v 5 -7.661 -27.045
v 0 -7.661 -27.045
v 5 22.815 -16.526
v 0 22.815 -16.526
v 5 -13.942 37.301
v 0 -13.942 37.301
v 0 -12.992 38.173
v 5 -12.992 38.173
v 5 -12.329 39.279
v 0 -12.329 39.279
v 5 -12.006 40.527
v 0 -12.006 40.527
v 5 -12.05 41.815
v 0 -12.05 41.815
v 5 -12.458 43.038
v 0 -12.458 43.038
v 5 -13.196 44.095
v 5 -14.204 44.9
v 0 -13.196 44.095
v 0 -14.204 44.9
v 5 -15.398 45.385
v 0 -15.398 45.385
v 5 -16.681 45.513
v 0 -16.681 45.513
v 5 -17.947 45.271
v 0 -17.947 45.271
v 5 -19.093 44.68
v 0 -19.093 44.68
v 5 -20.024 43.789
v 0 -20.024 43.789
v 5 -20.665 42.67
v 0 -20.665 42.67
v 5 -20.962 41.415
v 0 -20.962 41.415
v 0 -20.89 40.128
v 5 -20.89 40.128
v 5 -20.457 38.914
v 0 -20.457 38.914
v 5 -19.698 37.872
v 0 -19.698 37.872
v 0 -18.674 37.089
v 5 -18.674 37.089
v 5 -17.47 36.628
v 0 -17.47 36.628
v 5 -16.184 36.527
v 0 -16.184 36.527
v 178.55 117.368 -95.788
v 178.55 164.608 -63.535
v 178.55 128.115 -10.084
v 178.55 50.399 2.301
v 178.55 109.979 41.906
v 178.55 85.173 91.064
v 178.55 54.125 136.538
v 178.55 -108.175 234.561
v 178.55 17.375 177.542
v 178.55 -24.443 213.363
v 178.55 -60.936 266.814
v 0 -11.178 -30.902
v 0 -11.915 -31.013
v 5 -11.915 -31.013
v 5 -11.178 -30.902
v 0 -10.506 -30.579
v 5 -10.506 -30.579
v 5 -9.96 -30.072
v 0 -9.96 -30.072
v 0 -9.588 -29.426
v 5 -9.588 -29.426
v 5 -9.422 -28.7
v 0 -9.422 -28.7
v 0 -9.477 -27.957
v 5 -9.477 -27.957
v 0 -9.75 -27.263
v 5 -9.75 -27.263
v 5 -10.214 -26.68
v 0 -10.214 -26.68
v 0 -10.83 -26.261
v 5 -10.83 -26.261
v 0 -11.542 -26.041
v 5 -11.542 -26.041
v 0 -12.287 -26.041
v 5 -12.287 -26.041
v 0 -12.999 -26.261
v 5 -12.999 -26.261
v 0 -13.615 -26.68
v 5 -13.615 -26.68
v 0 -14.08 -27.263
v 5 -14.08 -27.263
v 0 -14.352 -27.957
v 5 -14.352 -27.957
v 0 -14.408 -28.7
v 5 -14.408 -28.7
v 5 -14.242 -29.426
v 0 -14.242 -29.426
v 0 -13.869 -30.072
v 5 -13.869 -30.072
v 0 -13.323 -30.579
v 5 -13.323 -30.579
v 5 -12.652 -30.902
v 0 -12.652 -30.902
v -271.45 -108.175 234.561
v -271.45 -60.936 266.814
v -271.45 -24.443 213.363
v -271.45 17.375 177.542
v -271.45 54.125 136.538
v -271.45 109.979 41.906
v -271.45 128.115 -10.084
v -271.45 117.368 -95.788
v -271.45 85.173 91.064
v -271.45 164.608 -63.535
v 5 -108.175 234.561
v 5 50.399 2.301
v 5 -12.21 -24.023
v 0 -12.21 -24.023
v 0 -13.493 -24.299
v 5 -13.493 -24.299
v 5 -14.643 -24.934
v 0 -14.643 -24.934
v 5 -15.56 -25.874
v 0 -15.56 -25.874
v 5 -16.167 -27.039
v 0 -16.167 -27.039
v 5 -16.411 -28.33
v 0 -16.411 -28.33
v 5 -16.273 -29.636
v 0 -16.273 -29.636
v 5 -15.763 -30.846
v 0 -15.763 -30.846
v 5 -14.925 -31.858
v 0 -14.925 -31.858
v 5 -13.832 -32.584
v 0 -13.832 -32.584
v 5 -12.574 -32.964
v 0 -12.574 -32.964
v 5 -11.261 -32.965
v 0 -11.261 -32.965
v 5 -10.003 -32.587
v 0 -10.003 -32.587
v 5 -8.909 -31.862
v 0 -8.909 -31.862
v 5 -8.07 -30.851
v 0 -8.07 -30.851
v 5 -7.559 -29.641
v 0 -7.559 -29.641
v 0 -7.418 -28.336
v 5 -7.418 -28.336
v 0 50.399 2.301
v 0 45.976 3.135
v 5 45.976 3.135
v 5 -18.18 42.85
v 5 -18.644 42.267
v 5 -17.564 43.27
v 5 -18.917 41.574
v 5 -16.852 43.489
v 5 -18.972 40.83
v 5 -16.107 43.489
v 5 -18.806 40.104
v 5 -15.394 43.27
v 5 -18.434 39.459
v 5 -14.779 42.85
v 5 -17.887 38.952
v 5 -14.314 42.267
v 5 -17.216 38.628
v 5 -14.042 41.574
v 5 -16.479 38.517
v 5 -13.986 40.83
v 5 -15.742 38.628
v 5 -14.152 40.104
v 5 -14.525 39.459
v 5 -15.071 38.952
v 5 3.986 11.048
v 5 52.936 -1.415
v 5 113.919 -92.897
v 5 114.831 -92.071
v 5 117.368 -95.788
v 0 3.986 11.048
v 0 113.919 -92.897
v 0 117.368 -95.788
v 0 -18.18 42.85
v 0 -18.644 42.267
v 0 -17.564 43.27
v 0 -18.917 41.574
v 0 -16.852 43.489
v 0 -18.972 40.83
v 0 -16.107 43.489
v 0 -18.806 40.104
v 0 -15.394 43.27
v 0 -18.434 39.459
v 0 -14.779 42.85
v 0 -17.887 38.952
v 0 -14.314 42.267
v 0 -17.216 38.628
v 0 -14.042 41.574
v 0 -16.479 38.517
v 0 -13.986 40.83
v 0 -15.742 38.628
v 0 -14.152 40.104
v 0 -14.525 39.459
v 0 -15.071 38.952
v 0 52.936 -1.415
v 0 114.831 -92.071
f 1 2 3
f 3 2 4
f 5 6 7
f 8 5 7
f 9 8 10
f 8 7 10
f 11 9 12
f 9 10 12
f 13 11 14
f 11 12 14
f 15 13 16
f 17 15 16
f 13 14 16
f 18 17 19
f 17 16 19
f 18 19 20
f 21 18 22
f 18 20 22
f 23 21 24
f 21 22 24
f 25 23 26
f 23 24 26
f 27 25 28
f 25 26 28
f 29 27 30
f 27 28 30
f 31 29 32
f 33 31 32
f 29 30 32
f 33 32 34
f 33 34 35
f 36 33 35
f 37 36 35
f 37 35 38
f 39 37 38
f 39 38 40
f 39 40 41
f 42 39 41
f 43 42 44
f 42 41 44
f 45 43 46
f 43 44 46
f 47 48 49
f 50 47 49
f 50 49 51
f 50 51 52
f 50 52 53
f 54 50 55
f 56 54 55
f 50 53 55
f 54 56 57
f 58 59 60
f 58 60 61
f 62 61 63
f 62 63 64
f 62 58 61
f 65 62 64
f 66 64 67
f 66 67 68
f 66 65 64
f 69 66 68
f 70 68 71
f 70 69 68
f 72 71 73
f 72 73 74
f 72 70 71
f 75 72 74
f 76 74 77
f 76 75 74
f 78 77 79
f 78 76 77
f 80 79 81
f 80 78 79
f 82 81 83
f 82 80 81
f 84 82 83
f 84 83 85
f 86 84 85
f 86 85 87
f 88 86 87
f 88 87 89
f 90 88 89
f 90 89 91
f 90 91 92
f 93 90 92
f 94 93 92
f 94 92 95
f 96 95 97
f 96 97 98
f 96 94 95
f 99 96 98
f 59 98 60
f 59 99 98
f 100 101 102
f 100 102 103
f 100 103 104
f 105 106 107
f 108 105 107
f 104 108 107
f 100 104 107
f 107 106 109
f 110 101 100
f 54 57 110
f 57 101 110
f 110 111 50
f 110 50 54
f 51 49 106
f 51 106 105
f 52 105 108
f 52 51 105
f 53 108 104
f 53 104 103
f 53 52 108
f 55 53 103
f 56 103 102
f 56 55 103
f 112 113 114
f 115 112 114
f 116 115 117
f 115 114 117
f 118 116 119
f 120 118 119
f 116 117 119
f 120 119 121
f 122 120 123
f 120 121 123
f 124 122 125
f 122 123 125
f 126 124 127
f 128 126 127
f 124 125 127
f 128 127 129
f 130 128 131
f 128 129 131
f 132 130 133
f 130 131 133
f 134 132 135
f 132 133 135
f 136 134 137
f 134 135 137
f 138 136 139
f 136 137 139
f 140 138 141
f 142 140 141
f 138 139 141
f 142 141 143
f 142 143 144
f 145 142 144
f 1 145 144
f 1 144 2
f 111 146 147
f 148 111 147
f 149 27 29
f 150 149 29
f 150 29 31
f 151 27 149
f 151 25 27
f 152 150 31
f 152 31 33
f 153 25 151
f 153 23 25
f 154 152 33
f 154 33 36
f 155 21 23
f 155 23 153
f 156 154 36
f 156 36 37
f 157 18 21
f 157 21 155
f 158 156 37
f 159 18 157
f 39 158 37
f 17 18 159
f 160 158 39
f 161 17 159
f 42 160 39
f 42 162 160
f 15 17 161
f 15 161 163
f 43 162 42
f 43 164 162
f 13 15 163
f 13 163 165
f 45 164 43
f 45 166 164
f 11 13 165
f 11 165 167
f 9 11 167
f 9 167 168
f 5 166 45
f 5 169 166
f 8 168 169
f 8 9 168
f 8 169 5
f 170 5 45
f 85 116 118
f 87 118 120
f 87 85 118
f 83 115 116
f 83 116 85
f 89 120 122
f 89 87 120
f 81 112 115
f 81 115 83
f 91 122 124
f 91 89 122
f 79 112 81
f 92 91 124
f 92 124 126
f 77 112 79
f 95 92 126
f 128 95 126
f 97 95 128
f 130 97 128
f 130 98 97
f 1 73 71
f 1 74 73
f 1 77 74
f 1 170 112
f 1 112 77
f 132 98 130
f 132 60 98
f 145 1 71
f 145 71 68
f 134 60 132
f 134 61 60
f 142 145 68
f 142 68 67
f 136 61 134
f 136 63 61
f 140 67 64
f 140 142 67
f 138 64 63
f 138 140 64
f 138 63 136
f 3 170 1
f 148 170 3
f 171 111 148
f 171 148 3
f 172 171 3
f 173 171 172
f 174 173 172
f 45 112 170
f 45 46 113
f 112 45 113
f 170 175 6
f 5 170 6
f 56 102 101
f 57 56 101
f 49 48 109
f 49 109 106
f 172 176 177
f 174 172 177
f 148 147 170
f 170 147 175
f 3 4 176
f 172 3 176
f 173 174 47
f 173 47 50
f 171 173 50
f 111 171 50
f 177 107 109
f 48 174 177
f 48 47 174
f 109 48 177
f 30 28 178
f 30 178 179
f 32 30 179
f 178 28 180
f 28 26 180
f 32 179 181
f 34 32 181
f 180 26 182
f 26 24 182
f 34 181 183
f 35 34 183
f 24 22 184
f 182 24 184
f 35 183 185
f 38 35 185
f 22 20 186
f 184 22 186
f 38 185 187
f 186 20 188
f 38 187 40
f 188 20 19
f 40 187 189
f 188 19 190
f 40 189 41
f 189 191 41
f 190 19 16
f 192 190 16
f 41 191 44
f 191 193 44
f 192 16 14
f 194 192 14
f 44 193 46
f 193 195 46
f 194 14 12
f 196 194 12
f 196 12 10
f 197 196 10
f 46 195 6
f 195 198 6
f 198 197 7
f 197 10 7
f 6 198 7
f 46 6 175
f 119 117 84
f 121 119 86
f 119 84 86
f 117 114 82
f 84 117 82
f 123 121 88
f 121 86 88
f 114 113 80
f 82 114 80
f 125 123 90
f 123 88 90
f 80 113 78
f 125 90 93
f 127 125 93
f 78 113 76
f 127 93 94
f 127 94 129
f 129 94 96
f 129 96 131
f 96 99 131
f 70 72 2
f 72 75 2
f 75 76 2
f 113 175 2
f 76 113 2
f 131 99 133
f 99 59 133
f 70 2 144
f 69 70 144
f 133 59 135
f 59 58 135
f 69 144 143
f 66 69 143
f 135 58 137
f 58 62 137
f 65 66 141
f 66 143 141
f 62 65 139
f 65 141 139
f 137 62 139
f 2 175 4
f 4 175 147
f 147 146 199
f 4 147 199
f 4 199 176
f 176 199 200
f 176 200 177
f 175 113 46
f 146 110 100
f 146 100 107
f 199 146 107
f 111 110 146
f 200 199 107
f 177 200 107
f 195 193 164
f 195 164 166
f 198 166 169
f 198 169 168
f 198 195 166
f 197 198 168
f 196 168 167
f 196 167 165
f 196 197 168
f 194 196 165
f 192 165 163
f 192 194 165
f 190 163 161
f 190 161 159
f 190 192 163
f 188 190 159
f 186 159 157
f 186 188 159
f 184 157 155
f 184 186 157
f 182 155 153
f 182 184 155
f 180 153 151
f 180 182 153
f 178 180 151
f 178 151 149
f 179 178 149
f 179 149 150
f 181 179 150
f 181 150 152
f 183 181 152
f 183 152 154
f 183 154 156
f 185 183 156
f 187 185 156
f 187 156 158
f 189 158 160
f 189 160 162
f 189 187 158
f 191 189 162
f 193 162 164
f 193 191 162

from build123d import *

# Parameters (mm, degrees)
ESBO_O2_R                = 2.5
RESSALTO_EXTRUS_O2_DEPTH = 5
RESSALTO_EXTRUS_O3_DEPTH = 173.55
RESSALTO_EXTRUS_O4_DEPTH = 276.45


with BuildPart() as part:
    # Esboço2 → Ressalto-extrusão2 (new body)
    # profile 1 of 2: a face of its own
    with BuildSketch(Plane(origin=(0, 0, 0), x_dir=(0, 0, -1), z_dir=(1, 0, 0))):
        with BuildLine():
            Line((27.044906217, -7.661000215), (16.526427317, 22.814878798))
            Line((16.526427317, 22.814878798), (-11.047978387, 3.985533348))
            Line((-11.047978387, 3.985533348), (-37.30105887, -13.941537387))
            ThreePointArc((-37.30105887, -13.941537387), (-45.271053286, -17.947334992), (-36.526951093, -16.184410638))
            Line((-36.526951093, -16.184410638), (24.022721227, -12.209541831))
            ThreePointArc((24.022721227, -12.209541831), (32.261148153, -14.405110119), (27.044906217, -7.661000215))
        make_face()
        with Locations((-41.017286054, -16.479185022)):
            Circle(ESBO_O2_R, mode=Mode.SUBTRACT)
        with Locations((28.513056188, -11.914767447)):
            Circle(ESBO_O2_R, mode=Mode.SUBTRACT)
    # profile 2 of 2: a face of its own
    with BuildSketch(Plane(origin=(0, 0, 0), x_dir=(0, 0, -1), z_dir=(1, 0, 0))):
        Polygon((-11.047978387, 3.985533348), (16.526427317, 22.814878798), (92.896691956, 113.919418087), (95.787558299, 117.368025311), (92.071137464, 114.830661289), (1.415245238, 52.935894913), (-2.301175596, 50.398530891), (-3.134557188, 45.976373598), align=None)
    extrude(amount=RESSALTO_EXTRUS_O2_DEPTH)



with BuildPart() as body_2:
    # Esboço3 → Ressalto-extrusão3 (new body)
    with BuildSketch(Plane(origin=(5, 0, 0), x_dir=(0, 0, -1), z_dir=(1, 0, 0))):
        with BuildLine():
            Line((-2.301175596, 50.398530891), (-234.560960335, -108.175443308))
            Line((-234.560960335, -108.175443308), (-266.813676347, -60.935605143))
            Line((-266.813676347, -60.935605143), (-213.363286032, -24.442671921))
            ThreePointArc((-213.363286032, -24.442671921), (-114.312493315, 70.398103063), (10.084451972, 128.114930253))
            Line((10.084451972, 128.114930253), (63.534842287, 164.607863476))
            Line((63.534842287, 164.607863476), (95.787558299, 117.368025311))
            Line((95.787558299, 117.368025311), (-2.301175596, 50.398530891))
        make_face()
    extrude(amount=RESSALTO_EXTRUS_O3_DEPTH)


with BuildPart() as part_1:
    add(part.part)

    add(body_2.part)  # Ressalto-extrusão4 merges body 2
    # Esboço4 → Ressalto-extrusão4 (add)
    with BuildSketch(Plane.ZY.offset(-5)):
        with BuildLine():
            Line((234.560960335, -108.175443308), (-95.787558299, 117.368025311))
            Line((-95.787558299, 117.368025311), (-63.534842287, 164.607863476))
            Line((-63.534842287, 164.607863476), (-10.084451972, 128.114930253))
            ThreePointArc((-10.084451972, 128.114930253), (114.312493315, 70.398103063), (213.363286032, -24.442671921))
            Line((213.363286032, -24.442671921), (266.813676347, -60.935605143))
            Line((266.813676347, -60.935605143), (234.560960335, -108.175443308))
        make_face()
    extrude(amount=RESSALTO_EXTRUS_O4_DEPTH)


solid = part_1.part
